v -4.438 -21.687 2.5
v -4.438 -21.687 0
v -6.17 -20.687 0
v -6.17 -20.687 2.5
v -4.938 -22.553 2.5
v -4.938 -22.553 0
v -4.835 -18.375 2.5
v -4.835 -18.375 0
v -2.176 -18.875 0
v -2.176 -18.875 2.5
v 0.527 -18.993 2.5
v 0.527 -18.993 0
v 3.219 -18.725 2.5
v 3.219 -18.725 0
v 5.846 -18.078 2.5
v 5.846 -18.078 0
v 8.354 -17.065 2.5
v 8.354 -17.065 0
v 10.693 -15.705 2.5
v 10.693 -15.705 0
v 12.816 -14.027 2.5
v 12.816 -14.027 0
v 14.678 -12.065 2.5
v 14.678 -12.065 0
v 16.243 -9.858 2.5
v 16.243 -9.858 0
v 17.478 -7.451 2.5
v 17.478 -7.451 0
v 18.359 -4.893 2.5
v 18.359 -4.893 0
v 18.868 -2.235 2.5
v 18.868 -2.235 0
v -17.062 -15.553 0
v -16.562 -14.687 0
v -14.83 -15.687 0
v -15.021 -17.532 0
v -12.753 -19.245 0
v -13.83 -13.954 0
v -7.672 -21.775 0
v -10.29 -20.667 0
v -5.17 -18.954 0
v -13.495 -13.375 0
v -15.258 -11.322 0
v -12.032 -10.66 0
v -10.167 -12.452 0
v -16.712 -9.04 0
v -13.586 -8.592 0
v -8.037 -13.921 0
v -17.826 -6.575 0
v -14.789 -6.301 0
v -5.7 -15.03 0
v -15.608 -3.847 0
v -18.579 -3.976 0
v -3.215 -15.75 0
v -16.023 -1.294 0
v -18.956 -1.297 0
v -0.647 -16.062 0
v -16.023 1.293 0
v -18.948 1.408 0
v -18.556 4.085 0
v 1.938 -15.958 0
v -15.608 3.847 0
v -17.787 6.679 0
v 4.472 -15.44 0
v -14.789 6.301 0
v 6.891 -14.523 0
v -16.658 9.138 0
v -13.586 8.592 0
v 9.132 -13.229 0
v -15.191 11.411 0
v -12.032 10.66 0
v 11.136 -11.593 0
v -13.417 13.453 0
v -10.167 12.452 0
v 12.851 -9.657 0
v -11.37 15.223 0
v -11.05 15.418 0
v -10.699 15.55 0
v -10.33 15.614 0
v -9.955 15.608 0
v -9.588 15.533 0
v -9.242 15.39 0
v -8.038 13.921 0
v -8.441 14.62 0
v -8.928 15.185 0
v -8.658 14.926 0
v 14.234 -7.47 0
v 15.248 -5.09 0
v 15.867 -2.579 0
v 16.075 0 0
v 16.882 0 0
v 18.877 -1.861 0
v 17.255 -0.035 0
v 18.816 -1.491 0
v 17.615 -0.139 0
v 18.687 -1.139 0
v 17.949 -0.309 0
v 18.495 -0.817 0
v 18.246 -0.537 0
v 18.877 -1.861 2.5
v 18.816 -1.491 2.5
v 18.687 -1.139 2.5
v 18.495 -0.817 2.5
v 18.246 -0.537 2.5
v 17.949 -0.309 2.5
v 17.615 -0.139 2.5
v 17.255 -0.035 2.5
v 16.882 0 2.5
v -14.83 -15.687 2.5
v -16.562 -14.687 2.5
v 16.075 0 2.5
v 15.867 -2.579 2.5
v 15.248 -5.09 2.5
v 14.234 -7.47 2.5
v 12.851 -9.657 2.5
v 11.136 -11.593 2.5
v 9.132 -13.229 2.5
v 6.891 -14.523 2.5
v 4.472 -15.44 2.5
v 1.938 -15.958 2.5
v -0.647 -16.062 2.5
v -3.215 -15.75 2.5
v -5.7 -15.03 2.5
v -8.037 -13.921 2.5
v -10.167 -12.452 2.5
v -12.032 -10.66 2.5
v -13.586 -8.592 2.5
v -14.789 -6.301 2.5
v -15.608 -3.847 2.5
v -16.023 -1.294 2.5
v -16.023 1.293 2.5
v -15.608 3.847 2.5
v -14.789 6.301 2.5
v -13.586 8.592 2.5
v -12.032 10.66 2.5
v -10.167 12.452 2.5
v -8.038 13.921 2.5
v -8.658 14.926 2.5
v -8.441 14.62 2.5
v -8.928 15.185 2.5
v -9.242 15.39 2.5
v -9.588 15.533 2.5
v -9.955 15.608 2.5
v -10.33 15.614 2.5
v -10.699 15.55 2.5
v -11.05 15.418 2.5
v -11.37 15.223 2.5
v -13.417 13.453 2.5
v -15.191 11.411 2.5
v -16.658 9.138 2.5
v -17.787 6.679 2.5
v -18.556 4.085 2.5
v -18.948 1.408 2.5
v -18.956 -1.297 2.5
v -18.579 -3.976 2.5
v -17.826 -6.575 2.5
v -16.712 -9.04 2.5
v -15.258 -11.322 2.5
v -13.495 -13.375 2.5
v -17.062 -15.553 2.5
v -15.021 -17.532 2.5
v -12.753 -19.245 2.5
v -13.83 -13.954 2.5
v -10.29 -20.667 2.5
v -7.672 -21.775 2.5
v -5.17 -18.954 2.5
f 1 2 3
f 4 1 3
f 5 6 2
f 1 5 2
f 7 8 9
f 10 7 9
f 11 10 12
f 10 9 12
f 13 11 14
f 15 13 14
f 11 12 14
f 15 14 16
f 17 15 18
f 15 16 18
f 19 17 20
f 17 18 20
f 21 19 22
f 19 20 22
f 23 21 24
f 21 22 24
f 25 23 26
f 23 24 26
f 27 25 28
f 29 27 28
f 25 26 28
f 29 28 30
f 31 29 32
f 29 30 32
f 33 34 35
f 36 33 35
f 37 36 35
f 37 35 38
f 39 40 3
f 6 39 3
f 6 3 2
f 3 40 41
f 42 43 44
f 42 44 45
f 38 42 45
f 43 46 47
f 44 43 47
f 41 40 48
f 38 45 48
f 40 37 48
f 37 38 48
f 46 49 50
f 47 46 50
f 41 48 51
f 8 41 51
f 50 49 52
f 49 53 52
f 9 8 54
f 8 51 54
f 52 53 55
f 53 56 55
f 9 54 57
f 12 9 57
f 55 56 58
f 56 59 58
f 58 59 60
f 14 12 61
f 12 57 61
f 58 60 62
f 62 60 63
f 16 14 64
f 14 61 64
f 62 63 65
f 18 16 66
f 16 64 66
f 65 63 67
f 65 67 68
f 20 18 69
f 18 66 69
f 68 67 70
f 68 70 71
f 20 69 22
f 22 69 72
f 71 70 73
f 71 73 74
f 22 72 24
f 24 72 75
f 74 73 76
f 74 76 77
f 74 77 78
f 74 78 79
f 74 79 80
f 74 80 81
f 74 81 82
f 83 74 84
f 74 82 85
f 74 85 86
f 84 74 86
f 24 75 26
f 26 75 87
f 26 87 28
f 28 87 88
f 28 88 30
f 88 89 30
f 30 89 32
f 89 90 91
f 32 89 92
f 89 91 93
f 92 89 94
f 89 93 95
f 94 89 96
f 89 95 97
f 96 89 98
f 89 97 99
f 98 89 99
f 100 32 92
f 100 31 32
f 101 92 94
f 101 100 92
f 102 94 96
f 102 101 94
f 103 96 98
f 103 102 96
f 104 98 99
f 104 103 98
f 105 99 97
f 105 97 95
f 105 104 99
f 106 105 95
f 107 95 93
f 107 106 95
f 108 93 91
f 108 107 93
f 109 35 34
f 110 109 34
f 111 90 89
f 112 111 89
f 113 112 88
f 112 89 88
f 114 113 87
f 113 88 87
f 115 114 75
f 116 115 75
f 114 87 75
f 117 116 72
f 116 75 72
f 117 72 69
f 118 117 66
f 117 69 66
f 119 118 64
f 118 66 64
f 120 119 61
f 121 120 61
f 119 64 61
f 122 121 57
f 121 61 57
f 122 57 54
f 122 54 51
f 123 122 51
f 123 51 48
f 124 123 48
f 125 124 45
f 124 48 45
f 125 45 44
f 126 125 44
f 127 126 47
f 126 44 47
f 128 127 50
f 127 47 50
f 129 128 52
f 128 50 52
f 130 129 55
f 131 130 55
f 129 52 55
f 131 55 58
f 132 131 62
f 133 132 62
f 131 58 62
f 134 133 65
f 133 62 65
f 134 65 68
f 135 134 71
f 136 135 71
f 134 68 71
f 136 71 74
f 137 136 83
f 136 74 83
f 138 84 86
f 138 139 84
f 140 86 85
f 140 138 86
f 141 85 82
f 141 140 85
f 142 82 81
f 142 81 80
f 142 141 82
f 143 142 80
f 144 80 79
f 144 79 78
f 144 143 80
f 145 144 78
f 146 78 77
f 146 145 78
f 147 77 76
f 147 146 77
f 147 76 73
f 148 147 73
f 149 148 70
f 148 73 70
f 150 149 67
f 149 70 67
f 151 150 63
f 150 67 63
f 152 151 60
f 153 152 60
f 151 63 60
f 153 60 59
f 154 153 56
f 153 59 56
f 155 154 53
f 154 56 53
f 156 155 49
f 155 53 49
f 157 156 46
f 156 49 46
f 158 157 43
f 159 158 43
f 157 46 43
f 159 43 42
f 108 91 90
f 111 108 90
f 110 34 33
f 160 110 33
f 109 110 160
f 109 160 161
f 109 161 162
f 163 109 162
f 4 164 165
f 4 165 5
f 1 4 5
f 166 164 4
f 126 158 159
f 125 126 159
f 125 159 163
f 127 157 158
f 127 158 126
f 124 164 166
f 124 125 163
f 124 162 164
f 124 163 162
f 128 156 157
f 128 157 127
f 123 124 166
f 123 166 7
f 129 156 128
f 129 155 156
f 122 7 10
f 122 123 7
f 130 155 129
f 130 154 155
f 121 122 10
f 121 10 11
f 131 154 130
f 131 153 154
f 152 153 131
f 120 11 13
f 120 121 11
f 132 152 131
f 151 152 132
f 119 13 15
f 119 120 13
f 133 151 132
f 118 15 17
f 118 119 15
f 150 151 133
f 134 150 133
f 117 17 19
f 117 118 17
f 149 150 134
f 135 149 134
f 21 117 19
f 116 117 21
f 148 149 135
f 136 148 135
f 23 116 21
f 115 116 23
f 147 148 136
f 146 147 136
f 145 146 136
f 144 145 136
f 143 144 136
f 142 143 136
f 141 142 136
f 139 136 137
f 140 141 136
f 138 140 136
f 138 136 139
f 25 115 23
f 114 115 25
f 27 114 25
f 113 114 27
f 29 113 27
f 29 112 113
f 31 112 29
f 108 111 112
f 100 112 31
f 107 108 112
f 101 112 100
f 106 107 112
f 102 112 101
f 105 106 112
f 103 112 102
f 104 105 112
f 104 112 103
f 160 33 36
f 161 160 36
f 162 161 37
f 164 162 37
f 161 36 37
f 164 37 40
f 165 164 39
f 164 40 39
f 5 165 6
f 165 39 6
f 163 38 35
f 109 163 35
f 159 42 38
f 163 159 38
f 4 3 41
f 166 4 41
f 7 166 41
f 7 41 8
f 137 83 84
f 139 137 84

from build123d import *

# Parameters (mm, degrees)
F1_DEPTH = 2.5
F2_R     = 2


with BuildPart() as f1:
    # F0 (on Top) → F1 (new body)
    with BuildSketch(Plane.XY):
        with BuildLine():
            Line((-8.0375, 13.921358), (-9.5, 16.454483))
            ThreePointArc((-9.5, 16.454483), (-18.831831, 2.522325), (-13.495278, -13.374508))
            ThreePointArc((-13.495278, -13.374508), (-9.5, -16.454483), (-4.835024, -18.374508))
            ThreePointArc((-4.835024, -18.374508), (11.600313, -15.047682), (19, 0))
            Line((19, 0), (16.075, 0))
            ThreePointArc((16.075, 0), (-8.0375, -13.921358), (-8.0375, 13.921358))
        make_face()
        with BuildLine():
            ThreePointArc((-4.835024, -18.374508), (-9.5, -16.454483), (-13.495278, -13.374508))
            Line((-13.495278, -13.374508), (-13.830127, -13.954483))
            Line((-13.830127, -13.954483), (-14.830127, -15.686533))
            Line((-14.830127, -15.686533), (-16.562178, -14.686533))
            Line((-16.562178, -14.686533), (-17.062178, -15.552559))
            ThreePointArc((-17.062178, -15.552559), (-11.543396, -19.993749), (-4.937822, -22.552559))
            Line((-4.937822, -22.552559), (-4.437822, -21.686533))
            Line((-4.437822, -21.686533), (-6.169873, -20.686533))
            Line((-6.169873, -20.686533), (-5.169873, -18.954483))
            Line((-5.169873, -18.954483), (-4.835024, -18.374508))
        make_face()
    extrude(amount=F1_DEPTH)

    # F2
    f2_edges = [f1.edges().sort_by_distance(p)[0] for p in [
        (19, 0, 1.25),
        (-9.5, 16.454483, 1.25),
    ]]
    fillet(f2_edges, radius=F2_R)


solid = f1.part
